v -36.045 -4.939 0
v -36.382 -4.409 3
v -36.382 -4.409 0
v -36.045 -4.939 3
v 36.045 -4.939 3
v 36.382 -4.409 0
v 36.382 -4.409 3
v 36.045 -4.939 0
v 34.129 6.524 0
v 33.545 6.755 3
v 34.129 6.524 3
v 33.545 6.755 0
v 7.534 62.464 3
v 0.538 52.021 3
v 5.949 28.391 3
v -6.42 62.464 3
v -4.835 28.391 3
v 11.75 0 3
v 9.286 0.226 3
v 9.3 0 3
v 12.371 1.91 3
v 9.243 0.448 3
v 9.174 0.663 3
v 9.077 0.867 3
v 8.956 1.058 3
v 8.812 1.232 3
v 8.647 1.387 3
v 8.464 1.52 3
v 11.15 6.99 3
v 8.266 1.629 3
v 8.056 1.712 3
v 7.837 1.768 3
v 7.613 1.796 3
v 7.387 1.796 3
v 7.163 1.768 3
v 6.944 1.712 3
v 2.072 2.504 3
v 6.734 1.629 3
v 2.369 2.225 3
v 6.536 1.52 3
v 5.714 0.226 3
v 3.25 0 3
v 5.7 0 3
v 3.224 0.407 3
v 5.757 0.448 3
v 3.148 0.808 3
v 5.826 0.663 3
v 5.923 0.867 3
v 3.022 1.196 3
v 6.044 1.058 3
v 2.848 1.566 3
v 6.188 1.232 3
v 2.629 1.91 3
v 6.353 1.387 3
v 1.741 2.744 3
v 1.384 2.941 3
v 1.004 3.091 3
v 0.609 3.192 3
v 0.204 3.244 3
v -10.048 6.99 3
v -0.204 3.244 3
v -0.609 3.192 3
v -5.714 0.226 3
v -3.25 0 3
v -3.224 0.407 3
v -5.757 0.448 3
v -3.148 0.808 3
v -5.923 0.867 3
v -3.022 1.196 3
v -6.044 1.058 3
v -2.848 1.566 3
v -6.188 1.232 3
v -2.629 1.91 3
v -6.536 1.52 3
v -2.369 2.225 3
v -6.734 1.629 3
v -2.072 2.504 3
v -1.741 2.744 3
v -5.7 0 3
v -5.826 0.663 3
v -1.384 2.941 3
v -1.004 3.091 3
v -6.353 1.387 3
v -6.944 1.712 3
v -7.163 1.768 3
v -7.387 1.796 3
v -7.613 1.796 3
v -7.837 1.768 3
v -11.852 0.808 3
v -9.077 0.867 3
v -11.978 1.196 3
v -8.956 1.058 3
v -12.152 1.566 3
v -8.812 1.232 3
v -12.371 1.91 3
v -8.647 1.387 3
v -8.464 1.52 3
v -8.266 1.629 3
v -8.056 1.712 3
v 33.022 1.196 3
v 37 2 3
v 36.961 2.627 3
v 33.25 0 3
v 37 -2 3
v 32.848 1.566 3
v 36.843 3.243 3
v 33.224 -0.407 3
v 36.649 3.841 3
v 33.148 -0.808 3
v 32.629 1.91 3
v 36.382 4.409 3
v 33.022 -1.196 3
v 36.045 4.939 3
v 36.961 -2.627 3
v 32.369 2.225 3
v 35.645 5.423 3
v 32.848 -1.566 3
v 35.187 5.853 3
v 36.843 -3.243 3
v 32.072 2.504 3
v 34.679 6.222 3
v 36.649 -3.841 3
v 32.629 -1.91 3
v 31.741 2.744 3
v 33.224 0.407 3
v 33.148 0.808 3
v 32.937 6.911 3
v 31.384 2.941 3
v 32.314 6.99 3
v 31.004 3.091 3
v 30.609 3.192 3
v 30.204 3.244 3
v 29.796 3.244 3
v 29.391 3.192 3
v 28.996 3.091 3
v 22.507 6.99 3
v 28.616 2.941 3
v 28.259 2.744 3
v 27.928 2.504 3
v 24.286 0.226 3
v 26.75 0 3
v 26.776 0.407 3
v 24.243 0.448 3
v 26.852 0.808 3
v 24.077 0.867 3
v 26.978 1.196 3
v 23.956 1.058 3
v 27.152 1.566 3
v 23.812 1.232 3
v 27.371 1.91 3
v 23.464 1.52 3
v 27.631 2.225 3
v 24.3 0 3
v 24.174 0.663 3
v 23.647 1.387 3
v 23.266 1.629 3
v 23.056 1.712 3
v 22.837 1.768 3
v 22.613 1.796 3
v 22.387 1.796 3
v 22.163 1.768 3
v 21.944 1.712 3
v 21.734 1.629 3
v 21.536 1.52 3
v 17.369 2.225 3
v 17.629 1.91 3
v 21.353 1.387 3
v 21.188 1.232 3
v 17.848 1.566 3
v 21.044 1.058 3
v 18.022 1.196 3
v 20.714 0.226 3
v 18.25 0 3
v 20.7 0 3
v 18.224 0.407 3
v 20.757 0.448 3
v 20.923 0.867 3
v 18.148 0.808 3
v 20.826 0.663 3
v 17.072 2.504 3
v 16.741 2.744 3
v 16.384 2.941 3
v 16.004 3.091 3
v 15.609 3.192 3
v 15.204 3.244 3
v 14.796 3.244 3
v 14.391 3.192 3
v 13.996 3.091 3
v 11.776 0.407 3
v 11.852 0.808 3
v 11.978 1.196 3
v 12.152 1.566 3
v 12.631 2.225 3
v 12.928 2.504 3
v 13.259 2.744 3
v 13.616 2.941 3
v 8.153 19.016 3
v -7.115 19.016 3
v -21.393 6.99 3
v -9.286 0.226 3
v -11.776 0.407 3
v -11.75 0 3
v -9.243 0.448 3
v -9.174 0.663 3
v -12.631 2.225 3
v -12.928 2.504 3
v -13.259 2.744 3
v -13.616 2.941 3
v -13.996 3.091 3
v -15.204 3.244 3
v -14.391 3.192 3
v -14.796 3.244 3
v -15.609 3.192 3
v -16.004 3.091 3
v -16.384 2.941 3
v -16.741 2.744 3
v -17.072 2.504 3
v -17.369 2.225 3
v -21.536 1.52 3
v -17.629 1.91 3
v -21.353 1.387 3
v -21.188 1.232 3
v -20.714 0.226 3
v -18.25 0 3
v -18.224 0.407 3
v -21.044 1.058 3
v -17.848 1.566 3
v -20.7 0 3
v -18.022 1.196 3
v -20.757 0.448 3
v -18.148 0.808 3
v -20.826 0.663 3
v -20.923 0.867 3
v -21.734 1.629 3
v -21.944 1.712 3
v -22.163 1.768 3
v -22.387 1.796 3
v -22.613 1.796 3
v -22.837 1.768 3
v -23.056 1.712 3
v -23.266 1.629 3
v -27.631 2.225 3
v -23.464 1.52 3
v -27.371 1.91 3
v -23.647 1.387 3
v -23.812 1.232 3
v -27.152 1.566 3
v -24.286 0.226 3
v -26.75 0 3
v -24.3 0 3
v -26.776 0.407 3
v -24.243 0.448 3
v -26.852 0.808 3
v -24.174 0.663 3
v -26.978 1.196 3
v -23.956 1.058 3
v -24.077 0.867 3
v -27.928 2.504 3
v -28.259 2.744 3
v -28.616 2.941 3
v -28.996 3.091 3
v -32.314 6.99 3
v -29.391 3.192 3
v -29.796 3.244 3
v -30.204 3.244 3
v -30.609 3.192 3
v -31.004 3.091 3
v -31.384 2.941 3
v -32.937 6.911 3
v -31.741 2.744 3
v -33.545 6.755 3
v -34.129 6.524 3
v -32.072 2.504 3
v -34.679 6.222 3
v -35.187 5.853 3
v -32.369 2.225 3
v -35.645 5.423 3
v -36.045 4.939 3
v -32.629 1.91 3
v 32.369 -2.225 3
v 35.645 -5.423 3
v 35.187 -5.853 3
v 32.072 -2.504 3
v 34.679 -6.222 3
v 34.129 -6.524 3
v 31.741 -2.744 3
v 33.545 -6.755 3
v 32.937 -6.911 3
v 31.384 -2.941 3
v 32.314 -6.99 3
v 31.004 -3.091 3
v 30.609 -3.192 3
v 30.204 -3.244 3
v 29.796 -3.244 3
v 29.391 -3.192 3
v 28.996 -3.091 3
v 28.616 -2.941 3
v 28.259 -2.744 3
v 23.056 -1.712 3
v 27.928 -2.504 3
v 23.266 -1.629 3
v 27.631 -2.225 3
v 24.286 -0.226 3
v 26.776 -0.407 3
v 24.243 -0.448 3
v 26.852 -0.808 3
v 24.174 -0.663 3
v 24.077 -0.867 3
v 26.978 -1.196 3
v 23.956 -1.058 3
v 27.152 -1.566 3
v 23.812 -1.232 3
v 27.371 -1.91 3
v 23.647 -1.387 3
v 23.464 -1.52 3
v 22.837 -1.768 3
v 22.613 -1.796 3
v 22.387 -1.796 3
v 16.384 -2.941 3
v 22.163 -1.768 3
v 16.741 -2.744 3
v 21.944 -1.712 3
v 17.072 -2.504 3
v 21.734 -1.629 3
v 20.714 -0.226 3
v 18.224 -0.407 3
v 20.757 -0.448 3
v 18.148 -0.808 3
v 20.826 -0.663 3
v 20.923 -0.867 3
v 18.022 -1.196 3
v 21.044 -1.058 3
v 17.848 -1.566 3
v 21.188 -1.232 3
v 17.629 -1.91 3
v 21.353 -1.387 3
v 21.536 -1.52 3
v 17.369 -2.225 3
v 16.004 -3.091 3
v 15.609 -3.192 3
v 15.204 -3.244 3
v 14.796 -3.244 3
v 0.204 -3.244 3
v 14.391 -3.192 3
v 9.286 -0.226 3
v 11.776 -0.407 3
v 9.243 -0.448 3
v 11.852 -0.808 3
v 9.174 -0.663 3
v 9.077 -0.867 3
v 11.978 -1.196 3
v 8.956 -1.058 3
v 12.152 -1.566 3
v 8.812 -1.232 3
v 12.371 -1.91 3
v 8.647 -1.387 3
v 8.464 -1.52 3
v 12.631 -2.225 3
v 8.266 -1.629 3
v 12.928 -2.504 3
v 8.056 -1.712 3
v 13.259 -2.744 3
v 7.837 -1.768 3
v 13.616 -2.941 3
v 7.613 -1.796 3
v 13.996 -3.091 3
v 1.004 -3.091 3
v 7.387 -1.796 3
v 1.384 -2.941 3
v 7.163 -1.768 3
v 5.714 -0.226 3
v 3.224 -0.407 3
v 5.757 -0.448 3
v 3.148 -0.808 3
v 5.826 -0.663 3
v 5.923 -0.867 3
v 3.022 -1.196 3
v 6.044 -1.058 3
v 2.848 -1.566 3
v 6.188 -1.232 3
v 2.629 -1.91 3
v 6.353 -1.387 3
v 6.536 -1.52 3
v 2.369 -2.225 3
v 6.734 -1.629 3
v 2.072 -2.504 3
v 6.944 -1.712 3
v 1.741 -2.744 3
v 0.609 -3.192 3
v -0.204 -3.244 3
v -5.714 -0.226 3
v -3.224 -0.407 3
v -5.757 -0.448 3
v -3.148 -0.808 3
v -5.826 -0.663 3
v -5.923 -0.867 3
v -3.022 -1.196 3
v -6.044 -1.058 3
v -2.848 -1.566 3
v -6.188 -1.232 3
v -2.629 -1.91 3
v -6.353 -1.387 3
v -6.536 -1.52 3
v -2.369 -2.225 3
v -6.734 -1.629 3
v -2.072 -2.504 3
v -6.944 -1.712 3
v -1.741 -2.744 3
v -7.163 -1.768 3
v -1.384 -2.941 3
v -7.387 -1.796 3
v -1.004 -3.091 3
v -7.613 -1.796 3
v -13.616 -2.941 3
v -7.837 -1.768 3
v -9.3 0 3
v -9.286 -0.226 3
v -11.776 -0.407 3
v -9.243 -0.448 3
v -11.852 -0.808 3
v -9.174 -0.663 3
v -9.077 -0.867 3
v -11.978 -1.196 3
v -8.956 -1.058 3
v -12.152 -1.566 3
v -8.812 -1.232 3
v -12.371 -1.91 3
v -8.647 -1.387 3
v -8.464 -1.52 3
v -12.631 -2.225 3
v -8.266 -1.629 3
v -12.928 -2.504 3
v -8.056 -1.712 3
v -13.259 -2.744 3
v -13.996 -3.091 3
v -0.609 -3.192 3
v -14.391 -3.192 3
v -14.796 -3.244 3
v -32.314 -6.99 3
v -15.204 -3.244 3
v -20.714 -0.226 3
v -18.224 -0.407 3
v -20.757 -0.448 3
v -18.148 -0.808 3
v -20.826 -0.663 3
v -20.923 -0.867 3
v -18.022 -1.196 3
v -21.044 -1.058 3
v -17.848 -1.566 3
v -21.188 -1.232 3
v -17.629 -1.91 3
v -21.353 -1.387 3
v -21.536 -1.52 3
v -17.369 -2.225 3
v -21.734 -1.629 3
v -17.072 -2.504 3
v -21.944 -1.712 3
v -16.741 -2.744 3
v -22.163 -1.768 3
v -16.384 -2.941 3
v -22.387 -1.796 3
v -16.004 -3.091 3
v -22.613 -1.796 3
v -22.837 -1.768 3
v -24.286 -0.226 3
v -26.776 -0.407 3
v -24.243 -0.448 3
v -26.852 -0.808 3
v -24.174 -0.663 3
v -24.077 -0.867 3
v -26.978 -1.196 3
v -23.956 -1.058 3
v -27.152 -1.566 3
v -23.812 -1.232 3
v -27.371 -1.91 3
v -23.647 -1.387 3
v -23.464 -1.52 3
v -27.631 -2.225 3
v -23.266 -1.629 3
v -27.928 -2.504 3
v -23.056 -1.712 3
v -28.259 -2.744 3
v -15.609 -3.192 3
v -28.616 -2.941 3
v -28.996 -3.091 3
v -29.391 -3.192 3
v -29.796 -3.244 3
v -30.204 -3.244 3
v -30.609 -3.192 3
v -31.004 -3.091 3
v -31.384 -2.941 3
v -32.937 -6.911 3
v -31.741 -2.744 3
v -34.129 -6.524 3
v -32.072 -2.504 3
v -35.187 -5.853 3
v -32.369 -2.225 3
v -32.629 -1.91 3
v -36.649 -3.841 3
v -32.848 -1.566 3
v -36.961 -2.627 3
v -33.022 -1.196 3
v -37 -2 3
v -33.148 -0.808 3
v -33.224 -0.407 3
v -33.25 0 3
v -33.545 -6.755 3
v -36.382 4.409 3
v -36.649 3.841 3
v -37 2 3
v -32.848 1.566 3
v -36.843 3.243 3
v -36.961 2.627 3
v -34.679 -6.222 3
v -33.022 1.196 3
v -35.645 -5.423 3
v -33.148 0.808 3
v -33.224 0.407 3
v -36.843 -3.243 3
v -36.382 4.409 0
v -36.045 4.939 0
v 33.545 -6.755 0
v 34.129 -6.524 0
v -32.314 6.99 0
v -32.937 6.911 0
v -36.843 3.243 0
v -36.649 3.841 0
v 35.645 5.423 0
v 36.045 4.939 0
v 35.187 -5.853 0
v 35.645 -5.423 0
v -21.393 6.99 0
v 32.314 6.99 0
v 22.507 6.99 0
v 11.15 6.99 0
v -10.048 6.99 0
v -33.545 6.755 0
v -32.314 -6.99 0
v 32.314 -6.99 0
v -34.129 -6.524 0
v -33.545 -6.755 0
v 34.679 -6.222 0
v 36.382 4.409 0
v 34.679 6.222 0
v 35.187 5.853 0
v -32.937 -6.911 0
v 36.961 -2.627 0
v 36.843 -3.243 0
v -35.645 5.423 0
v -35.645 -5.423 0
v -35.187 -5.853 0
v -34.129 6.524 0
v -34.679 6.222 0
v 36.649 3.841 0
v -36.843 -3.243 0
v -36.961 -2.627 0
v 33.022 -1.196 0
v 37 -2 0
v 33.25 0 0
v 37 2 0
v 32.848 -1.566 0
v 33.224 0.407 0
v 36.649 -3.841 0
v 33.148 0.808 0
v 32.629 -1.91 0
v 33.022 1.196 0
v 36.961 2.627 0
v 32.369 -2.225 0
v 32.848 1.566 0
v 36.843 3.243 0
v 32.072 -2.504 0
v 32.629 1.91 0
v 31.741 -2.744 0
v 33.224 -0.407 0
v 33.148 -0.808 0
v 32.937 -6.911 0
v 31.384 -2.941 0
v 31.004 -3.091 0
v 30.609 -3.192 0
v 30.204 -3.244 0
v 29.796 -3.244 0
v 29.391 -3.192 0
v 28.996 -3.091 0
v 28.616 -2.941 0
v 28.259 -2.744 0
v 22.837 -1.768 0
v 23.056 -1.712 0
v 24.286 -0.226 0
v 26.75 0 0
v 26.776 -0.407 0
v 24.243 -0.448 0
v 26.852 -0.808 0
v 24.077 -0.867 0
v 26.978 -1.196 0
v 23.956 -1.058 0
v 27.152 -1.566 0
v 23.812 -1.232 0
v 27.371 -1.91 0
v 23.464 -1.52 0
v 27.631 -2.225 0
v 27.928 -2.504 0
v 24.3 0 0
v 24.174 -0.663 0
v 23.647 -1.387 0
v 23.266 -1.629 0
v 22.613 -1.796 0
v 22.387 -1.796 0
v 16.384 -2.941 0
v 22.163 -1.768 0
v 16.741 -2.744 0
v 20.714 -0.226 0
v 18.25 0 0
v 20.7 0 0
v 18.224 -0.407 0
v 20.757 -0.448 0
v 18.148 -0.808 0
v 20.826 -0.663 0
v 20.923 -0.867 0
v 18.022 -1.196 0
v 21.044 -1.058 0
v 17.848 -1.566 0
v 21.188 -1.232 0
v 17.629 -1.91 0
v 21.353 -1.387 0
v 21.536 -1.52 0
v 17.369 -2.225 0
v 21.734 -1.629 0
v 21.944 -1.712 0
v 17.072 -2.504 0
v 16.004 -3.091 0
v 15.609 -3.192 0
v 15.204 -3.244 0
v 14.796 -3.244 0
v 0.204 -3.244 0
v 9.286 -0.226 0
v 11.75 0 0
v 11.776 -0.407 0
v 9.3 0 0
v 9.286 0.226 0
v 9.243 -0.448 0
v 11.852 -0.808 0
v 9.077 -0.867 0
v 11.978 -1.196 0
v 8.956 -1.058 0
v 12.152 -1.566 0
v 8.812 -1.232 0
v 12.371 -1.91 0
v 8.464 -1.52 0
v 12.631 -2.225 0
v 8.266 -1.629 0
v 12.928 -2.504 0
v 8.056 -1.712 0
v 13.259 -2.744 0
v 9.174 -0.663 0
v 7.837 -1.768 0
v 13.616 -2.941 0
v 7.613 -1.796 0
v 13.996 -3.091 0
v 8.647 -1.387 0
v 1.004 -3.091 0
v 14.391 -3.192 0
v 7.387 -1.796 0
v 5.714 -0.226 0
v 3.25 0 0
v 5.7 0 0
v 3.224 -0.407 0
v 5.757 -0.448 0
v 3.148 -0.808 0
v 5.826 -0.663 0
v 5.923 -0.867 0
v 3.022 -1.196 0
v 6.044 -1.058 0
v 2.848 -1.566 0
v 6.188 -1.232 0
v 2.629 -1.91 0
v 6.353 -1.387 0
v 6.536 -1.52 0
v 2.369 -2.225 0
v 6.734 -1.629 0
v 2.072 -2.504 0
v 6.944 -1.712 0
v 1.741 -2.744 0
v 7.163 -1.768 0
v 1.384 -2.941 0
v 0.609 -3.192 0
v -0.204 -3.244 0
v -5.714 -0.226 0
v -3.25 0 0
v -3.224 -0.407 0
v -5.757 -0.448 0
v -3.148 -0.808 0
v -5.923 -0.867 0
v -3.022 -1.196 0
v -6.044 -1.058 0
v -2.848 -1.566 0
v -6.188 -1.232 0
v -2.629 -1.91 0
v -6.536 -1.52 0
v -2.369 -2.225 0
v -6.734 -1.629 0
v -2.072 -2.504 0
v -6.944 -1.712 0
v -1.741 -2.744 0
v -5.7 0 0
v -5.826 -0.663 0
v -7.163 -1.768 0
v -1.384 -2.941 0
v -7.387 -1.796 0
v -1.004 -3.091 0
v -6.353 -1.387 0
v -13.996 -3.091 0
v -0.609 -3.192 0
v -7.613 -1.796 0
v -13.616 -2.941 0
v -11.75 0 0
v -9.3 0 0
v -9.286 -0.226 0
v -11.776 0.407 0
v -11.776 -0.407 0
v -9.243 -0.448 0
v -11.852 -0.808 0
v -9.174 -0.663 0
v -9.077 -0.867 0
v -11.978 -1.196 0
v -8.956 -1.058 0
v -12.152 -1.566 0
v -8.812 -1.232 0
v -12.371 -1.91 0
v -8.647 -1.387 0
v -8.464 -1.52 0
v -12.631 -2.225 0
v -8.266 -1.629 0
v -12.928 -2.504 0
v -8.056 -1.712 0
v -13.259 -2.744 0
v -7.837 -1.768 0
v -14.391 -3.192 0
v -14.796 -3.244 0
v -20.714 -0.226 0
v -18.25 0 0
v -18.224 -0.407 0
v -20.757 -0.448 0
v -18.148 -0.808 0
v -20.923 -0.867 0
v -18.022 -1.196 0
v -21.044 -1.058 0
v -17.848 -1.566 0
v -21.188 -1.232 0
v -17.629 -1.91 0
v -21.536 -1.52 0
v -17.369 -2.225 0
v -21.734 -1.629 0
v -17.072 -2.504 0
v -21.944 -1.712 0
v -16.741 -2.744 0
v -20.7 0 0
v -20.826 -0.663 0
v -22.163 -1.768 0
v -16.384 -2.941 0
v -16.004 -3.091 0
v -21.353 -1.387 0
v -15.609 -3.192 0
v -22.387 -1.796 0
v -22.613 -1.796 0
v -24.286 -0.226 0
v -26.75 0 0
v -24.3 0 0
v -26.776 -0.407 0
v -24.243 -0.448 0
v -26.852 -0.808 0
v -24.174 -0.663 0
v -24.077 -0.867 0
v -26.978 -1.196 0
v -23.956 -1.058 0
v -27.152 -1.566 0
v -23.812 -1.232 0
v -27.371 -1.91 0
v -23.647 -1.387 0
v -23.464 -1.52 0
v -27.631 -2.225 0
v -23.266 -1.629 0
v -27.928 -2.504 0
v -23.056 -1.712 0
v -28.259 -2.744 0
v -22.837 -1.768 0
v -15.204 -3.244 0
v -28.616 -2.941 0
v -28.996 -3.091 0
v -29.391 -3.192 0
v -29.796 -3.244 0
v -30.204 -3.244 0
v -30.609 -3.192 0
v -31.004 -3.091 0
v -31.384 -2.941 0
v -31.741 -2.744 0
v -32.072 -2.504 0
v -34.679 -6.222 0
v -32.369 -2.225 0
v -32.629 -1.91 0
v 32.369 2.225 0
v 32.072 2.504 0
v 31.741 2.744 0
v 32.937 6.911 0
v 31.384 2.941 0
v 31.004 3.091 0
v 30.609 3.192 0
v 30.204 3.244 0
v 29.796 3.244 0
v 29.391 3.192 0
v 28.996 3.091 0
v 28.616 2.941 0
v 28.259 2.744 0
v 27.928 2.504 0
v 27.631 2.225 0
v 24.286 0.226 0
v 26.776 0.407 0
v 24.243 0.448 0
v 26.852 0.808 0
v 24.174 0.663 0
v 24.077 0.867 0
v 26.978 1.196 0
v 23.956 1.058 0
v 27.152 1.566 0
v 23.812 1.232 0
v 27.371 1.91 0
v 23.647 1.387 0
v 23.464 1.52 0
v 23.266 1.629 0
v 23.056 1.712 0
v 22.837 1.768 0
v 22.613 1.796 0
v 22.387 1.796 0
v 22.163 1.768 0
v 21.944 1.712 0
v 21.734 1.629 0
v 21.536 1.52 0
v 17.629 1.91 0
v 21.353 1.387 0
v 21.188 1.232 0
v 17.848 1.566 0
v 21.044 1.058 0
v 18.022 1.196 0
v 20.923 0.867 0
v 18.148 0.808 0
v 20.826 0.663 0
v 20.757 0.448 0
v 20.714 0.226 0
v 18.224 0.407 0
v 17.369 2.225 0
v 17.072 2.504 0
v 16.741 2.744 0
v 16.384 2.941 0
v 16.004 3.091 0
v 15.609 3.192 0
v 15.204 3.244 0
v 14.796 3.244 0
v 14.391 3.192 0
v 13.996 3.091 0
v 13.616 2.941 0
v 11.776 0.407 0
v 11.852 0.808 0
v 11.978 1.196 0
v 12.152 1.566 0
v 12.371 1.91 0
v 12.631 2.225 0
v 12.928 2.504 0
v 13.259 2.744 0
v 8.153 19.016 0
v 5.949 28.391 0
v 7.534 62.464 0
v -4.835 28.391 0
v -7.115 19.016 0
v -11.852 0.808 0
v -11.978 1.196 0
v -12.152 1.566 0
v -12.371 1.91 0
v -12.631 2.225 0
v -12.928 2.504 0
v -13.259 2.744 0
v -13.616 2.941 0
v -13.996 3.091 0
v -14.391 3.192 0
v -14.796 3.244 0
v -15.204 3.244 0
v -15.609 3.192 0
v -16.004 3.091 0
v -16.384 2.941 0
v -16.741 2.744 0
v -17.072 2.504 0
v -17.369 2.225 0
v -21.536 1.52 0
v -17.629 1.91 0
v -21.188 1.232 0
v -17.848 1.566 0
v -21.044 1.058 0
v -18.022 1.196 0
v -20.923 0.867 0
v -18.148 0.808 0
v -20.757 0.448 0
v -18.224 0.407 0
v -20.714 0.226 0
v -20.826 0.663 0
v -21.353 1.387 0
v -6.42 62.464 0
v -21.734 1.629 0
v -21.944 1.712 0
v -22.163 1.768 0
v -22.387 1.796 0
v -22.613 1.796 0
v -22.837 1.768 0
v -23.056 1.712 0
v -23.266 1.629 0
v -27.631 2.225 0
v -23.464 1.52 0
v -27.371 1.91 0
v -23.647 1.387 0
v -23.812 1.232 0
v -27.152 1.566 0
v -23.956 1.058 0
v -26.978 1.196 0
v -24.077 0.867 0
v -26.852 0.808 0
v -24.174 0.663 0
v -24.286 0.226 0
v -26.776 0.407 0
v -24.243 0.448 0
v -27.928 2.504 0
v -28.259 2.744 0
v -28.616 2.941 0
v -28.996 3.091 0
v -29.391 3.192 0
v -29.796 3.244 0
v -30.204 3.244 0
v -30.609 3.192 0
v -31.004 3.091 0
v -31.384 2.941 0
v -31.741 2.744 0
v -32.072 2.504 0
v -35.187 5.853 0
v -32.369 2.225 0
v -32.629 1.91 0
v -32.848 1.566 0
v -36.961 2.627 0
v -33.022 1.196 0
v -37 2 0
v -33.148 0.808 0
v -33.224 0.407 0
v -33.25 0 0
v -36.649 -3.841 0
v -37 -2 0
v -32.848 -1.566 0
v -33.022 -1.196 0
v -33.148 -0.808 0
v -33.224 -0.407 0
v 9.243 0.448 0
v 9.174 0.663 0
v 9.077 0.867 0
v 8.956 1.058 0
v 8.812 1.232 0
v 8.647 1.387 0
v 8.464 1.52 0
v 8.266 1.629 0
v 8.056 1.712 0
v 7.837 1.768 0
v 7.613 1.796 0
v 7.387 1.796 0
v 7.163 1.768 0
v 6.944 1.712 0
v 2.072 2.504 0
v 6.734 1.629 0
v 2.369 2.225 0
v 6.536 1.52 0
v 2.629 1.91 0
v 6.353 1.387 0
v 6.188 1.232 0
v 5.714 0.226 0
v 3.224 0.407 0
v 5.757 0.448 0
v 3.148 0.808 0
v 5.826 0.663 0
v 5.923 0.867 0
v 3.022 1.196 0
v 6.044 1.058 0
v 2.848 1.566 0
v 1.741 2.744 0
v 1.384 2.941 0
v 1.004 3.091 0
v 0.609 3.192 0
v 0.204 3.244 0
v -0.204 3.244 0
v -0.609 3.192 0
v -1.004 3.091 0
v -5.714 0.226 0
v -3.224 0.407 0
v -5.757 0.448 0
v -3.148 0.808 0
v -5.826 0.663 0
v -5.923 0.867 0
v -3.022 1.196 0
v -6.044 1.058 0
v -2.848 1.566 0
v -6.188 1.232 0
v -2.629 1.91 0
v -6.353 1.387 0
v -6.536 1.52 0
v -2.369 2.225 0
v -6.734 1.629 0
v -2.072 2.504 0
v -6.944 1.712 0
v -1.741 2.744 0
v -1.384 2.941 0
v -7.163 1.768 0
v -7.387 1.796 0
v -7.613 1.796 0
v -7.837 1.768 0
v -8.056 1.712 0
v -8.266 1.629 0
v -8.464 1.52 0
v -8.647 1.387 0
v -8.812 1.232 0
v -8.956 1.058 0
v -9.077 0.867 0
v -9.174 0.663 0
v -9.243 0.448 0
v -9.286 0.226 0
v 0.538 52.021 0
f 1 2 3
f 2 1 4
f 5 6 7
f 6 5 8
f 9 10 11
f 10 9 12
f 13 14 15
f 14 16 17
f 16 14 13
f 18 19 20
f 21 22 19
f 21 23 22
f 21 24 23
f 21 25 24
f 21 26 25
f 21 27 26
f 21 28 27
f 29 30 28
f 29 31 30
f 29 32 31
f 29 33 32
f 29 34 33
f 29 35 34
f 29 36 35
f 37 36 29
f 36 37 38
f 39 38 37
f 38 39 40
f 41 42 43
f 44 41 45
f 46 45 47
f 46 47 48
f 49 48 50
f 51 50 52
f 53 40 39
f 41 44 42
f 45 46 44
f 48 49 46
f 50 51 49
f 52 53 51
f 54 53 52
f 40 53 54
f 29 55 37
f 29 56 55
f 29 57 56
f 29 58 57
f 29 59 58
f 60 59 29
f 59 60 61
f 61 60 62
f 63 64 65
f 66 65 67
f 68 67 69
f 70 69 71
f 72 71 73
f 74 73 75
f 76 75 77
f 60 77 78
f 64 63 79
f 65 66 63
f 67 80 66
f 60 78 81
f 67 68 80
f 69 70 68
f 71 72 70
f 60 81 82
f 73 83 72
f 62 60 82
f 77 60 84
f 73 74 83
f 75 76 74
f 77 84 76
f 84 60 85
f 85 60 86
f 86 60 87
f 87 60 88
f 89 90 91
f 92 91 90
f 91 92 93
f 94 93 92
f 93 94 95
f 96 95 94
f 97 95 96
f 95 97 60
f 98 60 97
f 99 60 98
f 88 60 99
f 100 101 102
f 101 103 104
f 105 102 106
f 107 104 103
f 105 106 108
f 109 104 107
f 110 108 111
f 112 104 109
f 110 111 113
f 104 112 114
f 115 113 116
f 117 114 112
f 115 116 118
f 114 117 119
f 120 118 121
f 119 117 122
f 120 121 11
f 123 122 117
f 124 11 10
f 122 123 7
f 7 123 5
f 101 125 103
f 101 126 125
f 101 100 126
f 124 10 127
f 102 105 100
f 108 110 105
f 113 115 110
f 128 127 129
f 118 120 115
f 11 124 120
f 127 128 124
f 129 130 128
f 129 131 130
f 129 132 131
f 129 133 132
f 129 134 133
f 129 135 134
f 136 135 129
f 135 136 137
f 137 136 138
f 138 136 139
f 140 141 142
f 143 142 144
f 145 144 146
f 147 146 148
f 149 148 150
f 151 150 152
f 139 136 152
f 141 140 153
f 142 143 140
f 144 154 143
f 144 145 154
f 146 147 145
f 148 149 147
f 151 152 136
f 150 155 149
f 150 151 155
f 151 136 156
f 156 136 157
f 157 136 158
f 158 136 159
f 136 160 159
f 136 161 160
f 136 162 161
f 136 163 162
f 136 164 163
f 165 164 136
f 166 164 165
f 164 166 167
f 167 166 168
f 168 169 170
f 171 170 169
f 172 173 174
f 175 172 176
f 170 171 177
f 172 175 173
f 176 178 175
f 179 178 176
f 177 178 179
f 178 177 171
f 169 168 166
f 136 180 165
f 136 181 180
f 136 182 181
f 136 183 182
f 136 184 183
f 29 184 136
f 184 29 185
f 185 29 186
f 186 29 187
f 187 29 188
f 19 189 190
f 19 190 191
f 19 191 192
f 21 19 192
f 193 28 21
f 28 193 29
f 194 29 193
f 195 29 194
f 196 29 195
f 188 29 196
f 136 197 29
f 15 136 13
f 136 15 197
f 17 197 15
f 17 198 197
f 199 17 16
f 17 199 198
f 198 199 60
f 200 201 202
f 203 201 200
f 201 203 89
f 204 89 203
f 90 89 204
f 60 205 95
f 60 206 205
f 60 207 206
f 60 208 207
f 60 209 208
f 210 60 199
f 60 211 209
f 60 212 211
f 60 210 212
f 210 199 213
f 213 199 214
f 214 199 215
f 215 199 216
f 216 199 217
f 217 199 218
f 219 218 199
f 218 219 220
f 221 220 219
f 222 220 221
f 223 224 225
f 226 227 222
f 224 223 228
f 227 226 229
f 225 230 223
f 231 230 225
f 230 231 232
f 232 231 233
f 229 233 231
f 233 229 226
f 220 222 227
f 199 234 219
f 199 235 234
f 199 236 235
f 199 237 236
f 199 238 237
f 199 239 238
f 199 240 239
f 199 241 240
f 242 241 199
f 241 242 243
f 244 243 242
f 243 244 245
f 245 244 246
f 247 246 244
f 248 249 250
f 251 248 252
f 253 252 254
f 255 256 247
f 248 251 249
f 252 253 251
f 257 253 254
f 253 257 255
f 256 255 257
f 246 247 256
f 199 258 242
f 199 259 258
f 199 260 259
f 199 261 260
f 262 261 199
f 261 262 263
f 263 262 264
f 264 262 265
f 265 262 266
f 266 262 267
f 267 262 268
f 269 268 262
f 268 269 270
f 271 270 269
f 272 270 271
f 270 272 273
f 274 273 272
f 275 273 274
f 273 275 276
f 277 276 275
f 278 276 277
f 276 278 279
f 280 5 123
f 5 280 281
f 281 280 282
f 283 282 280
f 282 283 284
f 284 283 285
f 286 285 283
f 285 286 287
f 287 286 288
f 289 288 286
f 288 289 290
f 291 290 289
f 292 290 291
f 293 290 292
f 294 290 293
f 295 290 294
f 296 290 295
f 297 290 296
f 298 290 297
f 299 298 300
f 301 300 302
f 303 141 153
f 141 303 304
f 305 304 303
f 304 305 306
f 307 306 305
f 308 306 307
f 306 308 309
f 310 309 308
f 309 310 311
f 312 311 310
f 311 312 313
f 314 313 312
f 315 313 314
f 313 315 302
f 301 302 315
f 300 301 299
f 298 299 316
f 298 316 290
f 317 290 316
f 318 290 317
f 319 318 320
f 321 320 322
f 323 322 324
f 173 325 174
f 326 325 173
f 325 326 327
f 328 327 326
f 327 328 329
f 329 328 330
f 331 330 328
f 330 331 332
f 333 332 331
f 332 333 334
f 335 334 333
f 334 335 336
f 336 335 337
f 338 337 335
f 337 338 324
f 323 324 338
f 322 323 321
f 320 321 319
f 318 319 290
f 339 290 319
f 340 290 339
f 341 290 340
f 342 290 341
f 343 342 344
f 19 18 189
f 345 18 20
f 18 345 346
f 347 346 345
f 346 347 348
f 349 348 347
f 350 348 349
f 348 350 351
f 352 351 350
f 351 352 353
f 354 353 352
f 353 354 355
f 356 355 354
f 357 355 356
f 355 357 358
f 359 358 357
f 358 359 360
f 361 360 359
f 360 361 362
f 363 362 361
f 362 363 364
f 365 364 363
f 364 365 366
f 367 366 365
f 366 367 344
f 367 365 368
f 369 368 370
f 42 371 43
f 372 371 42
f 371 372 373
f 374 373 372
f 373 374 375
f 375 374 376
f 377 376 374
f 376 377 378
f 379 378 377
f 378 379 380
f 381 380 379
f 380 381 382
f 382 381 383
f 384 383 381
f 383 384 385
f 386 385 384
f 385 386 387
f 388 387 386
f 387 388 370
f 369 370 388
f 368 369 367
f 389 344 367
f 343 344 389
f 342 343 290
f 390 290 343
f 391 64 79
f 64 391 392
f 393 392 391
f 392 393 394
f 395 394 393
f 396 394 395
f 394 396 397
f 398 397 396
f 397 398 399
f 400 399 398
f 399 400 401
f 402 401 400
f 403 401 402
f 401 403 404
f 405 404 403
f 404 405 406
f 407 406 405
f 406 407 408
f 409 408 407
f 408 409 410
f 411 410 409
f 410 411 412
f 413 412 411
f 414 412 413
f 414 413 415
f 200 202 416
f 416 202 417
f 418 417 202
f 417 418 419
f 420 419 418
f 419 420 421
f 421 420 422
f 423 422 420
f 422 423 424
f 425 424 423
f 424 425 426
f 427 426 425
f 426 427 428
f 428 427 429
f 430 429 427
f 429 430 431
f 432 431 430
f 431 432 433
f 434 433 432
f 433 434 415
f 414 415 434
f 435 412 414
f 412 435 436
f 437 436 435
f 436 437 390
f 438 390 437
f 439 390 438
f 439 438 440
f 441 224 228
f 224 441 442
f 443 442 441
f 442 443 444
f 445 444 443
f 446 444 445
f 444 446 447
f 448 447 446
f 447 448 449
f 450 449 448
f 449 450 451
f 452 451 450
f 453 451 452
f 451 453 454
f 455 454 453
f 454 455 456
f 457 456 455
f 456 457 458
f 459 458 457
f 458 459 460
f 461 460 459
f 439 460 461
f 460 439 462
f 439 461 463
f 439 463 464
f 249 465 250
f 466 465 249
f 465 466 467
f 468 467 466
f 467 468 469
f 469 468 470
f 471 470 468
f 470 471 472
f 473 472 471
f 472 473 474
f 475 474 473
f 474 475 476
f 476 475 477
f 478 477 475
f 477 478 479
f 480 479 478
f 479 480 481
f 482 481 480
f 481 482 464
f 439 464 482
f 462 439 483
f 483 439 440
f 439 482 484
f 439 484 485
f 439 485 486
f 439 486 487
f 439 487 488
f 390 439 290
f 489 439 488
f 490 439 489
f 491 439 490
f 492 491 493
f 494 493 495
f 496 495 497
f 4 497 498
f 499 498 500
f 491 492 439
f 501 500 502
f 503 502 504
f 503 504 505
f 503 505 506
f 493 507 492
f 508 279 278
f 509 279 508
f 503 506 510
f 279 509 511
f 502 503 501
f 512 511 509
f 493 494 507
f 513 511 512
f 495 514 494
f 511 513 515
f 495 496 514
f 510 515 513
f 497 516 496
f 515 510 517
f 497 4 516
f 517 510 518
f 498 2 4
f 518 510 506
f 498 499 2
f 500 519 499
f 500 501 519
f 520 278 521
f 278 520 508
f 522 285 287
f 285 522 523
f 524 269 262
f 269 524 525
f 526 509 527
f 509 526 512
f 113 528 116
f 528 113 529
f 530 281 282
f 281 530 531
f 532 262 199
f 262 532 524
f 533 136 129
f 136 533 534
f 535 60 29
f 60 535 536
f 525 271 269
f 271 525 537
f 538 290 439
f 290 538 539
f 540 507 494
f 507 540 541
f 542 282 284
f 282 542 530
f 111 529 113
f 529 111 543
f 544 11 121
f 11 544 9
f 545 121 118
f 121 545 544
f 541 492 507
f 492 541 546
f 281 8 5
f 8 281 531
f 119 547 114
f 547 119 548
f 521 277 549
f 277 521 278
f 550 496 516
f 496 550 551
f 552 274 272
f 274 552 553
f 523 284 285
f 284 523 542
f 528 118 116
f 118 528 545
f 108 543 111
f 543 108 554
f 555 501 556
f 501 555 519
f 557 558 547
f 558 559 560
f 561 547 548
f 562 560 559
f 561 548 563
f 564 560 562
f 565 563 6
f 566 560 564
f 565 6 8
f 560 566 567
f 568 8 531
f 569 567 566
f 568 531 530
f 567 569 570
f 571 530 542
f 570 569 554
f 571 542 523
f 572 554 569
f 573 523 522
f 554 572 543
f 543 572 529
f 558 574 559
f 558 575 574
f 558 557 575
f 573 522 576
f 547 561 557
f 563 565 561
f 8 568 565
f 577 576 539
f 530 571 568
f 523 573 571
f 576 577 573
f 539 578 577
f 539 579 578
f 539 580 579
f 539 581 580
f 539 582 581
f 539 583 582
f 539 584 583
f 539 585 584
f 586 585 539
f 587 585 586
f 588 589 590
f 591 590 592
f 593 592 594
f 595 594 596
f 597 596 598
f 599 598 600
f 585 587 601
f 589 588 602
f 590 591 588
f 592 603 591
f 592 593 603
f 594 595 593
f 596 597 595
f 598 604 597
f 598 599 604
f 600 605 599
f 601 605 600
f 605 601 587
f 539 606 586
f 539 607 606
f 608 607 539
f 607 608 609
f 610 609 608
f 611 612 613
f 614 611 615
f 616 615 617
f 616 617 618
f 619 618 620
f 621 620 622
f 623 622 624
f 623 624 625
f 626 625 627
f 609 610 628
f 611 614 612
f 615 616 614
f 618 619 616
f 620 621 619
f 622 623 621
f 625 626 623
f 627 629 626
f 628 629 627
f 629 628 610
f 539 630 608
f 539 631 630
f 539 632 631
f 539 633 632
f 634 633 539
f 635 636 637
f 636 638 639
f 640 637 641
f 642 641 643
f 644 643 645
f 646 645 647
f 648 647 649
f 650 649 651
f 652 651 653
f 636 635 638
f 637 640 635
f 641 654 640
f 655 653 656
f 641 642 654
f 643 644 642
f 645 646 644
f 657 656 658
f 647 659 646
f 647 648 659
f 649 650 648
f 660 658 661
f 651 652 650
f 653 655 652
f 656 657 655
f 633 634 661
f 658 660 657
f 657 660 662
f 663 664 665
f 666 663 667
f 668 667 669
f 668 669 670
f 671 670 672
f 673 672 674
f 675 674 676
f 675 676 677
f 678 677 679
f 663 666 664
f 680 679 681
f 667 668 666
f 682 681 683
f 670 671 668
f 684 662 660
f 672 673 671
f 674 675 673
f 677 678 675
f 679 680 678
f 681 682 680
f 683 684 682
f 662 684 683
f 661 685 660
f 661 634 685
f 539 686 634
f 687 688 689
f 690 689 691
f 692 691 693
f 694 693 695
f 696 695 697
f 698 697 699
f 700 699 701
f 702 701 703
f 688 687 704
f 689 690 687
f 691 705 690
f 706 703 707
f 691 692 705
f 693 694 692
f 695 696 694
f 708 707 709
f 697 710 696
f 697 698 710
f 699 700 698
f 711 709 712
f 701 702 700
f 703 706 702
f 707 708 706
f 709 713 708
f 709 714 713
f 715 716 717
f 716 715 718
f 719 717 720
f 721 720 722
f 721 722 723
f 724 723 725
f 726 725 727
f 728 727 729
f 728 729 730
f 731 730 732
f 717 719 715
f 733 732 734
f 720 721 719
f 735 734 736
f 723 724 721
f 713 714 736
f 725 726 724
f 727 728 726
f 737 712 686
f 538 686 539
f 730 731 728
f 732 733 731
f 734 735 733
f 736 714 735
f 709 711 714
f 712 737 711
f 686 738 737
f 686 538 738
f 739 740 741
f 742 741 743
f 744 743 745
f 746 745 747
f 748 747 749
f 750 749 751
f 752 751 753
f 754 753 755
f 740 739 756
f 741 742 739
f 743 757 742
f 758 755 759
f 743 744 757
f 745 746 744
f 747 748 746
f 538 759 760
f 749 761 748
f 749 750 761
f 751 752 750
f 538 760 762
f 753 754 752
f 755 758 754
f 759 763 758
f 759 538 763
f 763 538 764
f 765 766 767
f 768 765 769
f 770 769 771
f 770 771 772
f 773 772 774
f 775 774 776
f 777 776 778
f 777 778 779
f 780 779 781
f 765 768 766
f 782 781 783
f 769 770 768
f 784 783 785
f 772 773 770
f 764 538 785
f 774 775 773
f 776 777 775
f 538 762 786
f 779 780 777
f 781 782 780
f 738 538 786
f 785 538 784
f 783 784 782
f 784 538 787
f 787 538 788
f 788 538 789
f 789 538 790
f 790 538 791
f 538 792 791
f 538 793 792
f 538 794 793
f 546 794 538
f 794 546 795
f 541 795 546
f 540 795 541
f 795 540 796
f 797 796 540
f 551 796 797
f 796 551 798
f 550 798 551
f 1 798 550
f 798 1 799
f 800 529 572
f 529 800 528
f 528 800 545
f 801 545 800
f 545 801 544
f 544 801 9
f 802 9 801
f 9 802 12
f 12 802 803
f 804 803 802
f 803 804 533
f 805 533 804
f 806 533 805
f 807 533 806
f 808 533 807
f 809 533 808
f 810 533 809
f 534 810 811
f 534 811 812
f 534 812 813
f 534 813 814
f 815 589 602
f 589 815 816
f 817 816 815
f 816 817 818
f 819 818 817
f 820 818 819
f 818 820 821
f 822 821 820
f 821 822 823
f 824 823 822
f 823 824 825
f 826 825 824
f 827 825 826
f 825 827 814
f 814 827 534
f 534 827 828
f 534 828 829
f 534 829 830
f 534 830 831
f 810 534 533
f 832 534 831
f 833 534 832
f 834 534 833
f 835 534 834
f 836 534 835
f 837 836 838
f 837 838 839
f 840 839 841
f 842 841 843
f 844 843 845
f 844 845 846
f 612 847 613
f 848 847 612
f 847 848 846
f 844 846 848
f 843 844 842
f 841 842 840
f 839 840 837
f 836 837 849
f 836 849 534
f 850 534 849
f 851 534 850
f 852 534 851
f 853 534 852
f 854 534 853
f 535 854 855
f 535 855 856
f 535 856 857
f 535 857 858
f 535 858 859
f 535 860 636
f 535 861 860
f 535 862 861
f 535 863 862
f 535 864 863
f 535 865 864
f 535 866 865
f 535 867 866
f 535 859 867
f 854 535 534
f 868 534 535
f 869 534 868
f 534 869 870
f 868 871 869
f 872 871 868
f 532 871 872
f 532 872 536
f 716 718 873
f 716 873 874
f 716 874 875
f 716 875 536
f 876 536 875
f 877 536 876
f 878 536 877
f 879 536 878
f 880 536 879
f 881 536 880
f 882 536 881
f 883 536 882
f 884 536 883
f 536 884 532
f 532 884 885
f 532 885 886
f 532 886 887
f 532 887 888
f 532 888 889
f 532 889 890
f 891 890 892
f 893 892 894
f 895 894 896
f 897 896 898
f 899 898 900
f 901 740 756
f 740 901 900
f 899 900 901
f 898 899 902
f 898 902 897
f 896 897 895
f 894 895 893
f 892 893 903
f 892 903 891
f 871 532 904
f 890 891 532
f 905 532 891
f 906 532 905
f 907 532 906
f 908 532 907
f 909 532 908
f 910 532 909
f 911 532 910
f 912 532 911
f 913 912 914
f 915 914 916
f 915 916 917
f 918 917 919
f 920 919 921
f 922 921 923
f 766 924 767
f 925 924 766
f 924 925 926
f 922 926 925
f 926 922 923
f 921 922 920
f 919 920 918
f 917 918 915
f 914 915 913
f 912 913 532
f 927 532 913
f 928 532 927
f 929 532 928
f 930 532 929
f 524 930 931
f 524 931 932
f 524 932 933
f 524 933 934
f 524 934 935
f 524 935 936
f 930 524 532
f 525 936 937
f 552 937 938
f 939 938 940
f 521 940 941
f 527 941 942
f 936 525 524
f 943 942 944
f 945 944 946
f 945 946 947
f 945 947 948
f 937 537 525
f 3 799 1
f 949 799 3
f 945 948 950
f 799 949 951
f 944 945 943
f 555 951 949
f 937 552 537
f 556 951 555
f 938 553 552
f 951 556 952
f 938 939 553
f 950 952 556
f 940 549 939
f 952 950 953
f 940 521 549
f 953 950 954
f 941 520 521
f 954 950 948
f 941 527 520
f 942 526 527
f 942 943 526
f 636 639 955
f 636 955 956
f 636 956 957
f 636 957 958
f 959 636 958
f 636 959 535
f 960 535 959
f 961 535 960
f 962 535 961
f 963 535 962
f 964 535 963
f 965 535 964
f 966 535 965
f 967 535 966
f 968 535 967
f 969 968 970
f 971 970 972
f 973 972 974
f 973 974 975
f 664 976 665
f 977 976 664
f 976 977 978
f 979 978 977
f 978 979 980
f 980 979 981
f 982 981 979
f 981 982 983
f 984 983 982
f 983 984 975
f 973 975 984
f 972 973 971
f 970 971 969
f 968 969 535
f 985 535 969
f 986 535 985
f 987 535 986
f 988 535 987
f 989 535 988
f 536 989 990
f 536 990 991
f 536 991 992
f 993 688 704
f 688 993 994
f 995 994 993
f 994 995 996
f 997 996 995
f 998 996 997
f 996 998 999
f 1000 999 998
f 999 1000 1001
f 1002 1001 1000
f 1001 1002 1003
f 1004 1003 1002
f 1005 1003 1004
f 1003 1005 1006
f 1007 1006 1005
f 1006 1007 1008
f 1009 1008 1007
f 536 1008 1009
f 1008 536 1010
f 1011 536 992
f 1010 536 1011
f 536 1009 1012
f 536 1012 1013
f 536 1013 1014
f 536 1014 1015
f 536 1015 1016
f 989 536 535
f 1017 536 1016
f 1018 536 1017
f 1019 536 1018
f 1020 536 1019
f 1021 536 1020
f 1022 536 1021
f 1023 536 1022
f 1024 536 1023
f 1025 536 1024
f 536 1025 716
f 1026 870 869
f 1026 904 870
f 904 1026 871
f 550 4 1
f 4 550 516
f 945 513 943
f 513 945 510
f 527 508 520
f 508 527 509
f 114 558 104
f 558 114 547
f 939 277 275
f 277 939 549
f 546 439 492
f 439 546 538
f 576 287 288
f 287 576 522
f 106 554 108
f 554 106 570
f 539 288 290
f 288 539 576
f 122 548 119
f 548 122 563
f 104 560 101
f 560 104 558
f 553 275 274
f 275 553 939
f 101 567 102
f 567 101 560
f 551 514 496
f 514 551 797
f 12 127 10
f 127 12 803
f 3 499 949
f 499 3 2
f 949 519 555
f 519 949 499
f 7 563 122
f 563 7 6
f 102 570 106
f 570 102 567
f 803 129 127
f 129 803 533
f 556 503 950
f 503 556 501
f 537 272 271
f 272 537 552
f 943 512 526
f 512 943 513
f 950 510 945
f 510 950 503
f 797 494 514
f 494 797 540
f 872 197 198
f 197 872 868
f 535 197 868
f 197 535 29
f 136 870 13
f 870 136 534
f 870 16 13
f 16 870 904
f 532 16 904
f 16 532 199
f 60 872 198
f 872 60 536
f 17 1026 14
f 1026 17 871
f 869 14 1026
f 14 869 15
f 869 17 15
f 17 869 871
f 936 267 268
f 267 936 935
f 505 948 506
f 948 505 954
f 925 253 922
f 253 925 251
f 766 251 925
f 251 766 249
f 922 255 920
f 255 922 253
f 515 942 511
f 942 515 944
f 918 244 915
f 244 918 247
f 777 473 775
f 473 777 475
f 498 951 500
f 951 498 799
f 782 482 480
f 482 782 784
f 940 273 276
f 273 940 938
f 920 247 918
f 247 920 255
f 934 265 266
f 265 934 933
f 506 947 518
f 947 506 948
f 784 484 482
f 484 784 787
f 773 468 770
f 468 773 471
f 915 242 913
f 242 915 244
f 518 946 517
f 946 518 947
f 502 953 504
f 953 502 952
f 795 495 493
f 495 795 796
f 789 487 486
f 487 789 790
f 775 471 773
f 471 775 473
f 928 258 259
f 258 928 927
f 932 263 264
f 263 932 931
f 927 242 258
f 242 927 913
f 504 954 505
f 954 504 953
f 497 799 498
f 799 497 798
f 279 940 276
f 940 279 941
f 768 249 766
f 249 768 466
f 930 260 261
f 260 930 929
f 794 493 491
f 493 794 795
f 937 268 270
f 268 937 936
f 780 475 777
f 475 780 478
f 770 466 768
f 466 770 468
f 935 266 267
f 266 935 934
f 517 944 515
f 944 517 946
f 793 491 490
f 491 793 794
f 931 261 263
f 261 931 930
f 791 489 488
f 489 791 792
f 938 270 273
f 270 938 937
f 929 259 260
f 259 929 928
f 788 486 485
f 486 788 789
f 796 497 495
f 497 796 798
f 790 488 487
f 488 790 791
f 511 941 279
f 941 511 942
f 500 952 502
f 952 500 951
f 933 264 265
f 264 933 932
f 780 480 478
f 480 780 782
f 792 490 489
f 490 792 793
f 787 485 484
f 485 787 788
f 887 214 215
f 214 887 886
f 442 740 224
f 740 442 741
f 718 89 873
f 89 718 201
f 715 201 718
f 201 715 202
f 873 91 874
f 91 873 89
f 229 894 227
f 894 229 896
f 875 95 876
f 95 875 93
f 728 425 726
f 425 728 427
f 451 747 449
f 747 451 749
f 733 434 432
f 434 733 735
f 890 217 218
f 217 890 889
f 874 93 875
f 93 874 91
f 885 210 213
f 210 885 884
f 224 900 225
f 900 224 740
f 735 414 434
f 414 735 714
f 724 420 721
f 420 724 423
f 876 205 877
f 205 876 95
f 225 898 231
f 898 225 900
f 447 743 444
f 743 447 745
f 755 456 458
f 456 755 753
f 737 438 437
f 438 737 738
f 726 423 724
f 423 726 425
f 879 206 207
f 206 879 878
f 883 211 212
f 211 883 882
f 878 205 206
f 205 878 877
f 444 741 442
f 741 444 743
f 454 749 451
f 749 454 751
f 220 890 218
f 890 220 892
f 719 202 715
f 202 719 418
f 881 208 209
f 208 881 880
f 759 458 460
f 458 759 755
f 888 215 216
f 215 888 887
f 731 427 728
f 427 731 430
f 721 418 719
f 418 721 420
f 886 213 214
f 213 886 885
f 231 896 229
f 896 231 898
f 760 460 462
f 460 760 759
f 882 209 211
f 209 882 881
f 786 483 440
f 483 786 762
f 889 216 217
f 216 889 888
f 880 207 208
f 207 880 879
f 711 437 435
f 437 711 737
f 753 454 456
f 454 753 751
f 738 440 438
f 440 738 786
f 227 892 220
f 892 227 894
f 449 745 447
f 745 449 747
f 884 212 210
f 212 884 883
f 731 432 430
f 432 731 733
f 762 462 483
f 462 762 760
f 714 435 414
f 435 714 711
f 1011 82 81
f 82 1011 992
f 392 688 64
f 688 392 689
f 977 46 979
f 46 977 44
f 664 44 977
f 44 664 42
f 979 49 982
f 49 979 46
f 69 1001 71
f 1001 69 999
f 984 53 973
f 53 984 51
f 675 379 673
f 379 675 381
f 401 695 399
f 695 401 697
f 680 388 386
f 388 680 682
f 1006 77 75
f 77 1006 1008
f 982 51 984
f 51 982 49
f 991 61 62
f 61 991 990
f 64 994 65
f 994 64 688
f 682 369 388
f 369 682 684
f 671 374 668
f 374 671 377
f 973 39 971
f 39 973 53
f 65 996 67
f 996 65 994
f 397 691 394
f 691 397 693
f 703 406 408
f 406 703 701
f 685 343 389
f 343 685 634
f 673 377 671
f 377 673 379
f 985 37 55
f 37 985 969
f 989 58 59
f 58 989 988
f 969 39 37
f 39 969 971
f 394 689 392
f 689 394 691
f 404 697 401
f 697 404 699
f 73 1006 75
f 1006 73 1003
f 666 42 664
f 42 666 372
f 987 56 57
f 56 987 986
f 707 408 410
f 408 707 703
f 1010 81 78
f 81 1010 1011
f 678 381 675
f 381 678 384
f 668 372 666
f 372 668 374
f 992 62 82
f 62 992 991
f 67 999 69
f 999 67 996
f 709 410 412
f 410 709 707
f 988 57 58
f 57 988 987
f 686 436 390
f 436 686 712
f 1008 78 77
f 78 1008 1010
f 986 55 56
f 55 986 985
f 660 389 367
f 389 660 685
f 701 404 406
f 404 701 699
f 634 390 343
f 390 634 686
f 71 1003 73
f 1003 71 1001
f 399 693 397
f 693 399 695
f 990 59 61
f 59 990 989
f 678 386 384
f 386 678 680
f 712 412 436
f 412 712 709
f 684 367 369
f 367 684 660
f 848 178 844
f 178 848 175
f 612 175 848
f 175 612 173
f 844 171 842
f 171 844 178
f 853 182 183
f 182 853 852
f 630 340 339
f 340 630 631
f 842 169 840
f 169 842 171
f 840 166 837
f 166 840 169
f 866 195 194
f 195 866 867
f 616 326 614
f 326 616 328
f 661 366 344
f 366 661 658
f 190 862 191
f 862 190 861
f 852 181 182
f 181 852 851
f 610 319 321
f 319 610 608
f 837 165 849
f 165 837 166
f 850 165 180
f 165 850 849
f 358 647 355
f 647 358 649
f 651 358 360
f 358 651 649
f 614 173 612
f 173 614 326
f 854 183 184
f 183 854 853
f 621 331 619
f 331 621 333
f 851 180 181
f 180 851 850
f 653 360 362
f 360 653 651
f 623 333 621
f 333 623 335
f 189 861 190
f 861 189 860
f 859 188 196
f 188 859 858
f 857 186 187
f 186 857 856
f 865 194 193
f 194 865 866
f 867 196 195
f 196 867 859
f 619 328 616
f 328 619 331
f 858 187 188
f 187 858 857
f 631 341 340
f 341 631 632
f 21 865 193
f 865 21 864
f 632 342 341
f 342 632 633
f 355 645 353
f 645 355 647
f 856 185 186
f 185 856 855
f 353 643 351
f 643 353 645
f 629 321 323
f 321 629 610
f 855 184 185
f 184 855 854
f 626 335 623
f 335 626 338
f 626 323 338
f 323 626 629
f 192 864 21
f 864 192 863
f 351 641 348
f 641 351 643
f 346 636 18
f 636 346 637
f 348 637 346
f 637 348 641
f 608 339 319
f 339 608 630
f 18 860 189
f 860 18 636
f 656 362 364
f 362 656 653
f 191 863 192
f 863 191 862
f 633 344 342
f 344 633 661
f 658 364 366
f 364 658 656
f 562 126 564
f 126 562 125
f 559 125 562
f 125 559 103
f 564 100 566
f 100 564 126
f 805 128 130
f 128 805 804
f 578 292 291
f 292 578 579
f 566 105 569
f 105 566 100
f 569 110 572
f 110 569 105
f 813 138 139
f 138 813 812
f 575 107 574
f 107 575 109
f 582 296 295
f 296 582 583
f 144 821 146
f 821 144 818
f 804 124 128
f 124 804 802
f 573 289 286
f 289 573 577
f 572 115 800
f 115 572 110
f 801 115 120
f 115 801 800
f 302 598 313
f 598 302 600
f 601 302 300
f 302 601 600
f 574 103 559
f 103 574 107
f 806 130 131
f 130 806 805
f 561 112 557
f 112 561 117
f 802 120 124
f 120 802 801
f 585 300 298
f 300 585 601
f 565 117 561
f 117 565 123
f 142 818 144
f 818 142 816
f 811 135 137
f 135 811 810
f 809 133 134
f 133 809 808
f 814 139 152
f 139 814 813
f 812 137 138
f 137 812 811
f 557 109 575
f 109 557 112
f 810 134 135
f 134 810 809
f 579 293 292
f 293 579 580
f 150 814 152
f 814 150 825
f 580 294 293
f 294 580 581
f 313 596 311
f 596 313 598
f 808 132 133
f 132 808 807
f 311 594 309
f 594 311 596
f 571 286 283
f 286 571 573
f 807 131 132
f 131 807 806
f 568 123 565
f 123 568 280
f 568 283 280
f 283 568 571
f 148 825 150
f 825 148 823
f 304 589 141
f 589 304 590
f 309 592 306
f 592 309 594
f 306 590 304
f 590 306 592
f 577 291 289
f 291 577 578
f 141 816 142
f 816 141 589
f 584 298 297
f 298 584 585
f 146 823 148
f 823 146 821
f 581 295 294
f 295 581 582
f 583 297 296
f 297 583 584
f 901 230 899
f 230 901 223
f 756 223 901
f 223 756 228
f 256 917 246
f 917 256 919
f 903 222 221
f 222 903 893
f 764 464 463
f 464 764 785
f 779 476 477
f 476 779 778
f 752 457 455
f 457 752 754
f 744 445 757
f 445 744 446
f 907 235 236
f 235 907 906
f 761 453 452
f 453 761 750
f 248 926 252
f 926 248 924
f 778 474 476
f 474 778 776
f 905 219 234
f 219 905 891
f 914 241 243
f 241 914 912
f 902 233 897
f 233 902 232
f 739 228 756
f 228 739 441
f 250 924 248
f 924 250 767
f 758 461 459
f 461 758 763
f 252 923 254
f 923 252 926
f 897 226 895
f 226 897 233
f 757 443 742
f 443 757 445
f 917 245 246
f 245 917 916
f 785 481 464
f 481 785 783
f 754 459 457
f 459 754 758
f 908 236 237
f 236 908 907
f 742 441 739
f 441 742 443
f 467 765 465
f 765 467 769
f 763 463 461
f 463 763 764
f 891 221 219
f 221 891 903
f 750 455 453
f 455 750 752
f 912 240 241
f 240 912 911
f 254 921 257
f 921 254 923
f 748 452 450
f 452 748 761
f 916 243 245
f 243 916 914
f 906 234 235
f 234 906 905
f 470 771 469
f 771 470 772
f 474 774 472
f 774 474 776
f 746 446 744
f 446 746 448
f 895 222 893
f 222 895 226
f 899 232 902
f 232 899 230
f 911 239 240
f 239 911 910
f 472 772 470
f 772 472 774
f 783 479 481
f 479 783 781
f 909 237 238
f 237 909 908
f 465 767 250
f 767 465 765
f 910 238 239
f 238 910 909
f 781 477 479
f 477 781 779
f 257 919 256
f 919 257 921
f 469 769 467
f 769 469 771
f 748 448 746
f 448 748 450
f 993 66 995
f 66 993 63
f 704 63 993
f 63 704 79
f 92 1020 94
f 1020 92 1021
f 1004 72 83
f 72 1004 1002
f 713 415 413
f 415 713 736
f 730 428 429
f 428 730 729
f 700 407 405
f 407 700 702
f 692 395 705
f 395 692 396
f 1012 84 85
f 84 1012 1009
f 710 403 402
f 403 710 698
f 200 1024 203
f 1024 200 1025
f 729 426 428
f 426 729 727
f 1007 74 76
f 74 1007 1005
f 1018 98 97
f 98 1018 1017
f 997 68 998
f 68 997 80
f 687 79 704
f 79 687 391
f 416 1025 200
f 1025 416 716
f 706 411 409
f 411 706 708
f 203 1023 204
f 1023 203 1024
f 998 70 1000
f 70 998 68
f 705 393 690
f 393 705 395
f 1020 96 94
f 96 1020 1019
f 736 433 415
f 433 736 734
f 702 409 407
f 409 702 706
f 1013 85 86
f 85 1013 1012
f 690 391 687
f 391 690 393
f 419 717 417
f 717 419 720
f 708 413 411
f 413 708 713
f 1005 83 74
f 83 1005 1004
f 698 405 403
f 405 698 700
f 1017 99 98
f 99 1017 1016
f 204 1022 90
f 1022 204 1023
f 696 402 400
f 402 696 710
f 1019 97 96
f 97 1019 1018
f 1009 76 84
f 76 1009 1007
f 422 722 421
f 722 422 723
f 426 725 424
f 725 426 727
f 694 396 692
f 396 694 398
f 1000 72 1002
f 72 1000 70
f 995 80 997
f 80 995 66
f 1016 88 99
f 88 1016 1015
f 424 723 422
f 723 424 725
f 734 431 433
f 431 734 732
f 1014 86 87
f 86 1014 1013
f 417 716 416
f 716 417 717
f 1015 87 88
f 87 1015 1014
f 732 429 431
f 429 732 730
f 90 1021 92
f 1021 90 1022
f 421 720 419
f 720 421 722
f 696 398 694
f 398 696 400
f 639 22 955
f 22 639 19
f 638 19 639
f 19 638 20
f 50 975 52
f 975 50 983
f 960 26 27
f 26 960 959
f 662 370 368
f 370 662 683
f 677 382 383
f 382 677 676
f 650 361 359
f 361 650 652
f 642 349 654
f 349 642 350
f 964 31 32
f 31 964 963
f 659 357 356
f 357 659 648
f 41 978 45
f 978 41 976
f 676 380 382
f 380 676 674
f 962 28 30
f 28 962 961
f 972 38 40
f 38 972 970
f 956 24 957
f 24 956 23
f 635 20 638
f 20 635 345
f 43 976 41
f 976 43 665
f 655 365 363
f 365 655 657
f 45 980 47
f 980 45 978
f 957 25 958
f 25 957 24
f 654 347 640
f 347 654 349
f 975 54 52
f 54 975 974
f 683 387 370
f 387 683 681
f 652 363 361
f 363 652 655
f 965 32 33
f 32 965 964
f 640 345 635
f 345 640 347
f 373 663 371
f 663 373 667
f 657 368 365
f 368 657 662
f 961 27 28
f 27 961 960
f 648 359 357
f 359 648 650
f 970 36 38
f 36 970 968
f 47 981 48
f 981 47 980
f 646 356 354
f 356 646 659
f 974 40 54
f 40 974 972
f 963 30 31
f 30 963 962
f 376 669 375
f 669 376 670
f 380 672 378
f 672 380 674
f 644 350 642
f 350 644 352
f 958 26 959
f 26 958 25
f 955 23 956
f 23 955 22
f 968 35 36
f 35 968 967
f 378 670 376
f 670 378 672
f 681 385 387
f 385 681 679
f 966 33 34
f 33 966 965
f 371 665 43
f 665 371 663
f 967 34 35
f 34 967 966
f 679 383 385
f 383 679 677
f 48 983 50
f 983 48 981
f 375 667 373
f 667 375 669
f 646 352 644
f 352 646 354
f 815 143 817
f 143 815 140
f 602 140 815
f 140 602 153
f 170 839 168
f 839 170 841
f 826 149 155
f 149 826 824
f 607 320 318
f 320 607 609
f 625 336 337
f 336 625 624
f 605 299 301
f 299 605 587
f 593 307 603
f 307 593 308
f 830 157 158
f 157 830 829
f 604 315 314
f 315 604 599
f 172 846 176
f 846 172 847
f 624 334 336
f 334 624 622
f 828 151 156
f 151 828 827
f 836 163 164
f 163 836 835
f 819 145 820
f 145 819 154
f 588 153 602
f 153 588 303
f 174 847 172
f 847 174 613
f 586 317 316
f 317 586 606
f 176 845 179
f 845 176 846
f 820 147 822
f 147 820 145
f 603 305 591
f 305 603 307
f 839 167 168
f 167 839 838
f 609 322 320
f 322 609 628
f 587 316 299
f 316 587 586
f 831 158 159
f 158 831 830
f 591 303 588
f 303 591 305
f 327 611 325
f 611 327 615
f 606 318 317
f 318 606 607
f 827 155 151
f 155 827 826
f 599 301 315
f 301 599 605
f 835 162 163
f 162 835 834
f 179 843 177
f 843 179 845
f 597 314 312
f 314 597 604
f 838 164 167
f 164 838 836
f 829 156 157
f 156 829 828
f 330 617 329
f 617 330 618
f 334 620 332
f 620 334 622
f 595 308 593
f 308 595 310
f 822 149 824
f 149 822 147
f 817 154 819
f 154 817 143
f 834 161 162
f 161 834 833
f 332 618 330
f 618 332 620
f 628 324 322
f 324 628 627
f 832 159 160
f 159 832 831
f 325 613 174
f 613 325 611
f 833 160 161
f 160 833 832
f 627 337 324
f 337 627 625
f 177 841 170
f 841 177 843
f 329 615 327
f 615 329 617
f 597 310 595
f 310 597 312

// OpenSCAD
$fn = 50;


difference() {
	union() {
		hull() {
			translate(v = [-32.0000000000, 2.0000000000, 0]) {
				cylinder(h = 3, r = 5);
			}
			translate(v = [32.0000000000, 2.0000000000, 0]) {
				cylinder(h = 3, r = 5);
			}
			translate(v = [-32.0000000000, -2.0000000000, 0]) {
				cylinder(h = 3, r = 5);
			}
			translate(v = [32.0000000000, -2.0000000000, 0]) {
				cylinder(h = 3, r = 5);
			}
		}
		translate(v = [0, 61.1111111111, 0]) {
			linear_extrude(height = 3) {
				text(font = "DejaVu Sans Mono:style=Bold", halign = "center", size = 57.0000000000, text = "A", valign = "top");
			}
		}
	}
	union() {
		translate(v = [-30.0000000000, 0.0000000000, 0]) {
			translate(v = [0, 0, -100]) {
				cylinder(h = 200, r = 3.2500000000);
			}
		}
		translate(v = [-15.0000000000, 0.0000000000, 0]) {
			translate(v = [0, 0, -100]) {
				cylinder(h = 200, r = 3.2500000000);
			}
		}
		translate(v = [0, 0, -100]) {
			cylinder(h = 200, r = 3.2500000000);
		}
		translate(v = [15.0000000000, 0.0000000000, 0]) {
			translate(v = [0, 0, -100]) {
				cylinder(h = 200, r = 3.2500000000);
			}
		}
		translate(v = [30.0000000000, 0.0000000000, 0]) {
			translate(v = [0, 0, -100]) {
				cylinder(h = 200, r = 3.2500000000);
			}
		}
		translate(v = [-30.0000000000, 0.0000000000, 0]) {
			translate(v = [0, 0, -100]) {
				cylinder(h = 200, r = 1.8000000000);
			}
		}
		translate(v = [-22.5000000000, 0.0000000000, 0]) {
			translate(v = [0, 0, -100]) {
				cylinder(h = 200, r = 1.8000000000);
			}
		}
		translate(v = [-15.0000000000, 0.0000000000, 0]) {
			translate(v = [0, 0, -100]) {
				cylinder(h = 200, r = 1.8000000000);
			}
		}
		translate(v = [-7.5000000000, 0.0000000000, 0]) {
			translate(v = [0, 0, -100]) {
				cylinder(h = 200, r = 1.8000000000);
			}
		}
		translate(v = [0, 0, -100]) {
			cylinder(h = 200, r = 1.8000000000);
		}
		translate(v = [7.5000000000, 0.0000000000, 0]) {
			translate(v = [0, 0, -100]) {
				cylinder(h = 200, r = 1.8000000000);
			}
		}
		translate(v = [15.0000000000, 0.0000000000, 0]) {
			translate(v = [0, 0, -100]) {
				cylinder(h = 200, r = 1.8000000000);
			}
		}
		translate(v = [22.5000000000, 0.0000000000, 0]) {
			translate(v = [0, 0, -100]) {
				cylinder(h = 200, r = 1.8000000000);
			}
		}
		translate(v = [30.0000000000, 0.0000000000, 0]) {
			translate(v = [0, 0, -100]) {
				cylinder(h = 200, r = 1.8000000000);
			}
		}
	}
}
